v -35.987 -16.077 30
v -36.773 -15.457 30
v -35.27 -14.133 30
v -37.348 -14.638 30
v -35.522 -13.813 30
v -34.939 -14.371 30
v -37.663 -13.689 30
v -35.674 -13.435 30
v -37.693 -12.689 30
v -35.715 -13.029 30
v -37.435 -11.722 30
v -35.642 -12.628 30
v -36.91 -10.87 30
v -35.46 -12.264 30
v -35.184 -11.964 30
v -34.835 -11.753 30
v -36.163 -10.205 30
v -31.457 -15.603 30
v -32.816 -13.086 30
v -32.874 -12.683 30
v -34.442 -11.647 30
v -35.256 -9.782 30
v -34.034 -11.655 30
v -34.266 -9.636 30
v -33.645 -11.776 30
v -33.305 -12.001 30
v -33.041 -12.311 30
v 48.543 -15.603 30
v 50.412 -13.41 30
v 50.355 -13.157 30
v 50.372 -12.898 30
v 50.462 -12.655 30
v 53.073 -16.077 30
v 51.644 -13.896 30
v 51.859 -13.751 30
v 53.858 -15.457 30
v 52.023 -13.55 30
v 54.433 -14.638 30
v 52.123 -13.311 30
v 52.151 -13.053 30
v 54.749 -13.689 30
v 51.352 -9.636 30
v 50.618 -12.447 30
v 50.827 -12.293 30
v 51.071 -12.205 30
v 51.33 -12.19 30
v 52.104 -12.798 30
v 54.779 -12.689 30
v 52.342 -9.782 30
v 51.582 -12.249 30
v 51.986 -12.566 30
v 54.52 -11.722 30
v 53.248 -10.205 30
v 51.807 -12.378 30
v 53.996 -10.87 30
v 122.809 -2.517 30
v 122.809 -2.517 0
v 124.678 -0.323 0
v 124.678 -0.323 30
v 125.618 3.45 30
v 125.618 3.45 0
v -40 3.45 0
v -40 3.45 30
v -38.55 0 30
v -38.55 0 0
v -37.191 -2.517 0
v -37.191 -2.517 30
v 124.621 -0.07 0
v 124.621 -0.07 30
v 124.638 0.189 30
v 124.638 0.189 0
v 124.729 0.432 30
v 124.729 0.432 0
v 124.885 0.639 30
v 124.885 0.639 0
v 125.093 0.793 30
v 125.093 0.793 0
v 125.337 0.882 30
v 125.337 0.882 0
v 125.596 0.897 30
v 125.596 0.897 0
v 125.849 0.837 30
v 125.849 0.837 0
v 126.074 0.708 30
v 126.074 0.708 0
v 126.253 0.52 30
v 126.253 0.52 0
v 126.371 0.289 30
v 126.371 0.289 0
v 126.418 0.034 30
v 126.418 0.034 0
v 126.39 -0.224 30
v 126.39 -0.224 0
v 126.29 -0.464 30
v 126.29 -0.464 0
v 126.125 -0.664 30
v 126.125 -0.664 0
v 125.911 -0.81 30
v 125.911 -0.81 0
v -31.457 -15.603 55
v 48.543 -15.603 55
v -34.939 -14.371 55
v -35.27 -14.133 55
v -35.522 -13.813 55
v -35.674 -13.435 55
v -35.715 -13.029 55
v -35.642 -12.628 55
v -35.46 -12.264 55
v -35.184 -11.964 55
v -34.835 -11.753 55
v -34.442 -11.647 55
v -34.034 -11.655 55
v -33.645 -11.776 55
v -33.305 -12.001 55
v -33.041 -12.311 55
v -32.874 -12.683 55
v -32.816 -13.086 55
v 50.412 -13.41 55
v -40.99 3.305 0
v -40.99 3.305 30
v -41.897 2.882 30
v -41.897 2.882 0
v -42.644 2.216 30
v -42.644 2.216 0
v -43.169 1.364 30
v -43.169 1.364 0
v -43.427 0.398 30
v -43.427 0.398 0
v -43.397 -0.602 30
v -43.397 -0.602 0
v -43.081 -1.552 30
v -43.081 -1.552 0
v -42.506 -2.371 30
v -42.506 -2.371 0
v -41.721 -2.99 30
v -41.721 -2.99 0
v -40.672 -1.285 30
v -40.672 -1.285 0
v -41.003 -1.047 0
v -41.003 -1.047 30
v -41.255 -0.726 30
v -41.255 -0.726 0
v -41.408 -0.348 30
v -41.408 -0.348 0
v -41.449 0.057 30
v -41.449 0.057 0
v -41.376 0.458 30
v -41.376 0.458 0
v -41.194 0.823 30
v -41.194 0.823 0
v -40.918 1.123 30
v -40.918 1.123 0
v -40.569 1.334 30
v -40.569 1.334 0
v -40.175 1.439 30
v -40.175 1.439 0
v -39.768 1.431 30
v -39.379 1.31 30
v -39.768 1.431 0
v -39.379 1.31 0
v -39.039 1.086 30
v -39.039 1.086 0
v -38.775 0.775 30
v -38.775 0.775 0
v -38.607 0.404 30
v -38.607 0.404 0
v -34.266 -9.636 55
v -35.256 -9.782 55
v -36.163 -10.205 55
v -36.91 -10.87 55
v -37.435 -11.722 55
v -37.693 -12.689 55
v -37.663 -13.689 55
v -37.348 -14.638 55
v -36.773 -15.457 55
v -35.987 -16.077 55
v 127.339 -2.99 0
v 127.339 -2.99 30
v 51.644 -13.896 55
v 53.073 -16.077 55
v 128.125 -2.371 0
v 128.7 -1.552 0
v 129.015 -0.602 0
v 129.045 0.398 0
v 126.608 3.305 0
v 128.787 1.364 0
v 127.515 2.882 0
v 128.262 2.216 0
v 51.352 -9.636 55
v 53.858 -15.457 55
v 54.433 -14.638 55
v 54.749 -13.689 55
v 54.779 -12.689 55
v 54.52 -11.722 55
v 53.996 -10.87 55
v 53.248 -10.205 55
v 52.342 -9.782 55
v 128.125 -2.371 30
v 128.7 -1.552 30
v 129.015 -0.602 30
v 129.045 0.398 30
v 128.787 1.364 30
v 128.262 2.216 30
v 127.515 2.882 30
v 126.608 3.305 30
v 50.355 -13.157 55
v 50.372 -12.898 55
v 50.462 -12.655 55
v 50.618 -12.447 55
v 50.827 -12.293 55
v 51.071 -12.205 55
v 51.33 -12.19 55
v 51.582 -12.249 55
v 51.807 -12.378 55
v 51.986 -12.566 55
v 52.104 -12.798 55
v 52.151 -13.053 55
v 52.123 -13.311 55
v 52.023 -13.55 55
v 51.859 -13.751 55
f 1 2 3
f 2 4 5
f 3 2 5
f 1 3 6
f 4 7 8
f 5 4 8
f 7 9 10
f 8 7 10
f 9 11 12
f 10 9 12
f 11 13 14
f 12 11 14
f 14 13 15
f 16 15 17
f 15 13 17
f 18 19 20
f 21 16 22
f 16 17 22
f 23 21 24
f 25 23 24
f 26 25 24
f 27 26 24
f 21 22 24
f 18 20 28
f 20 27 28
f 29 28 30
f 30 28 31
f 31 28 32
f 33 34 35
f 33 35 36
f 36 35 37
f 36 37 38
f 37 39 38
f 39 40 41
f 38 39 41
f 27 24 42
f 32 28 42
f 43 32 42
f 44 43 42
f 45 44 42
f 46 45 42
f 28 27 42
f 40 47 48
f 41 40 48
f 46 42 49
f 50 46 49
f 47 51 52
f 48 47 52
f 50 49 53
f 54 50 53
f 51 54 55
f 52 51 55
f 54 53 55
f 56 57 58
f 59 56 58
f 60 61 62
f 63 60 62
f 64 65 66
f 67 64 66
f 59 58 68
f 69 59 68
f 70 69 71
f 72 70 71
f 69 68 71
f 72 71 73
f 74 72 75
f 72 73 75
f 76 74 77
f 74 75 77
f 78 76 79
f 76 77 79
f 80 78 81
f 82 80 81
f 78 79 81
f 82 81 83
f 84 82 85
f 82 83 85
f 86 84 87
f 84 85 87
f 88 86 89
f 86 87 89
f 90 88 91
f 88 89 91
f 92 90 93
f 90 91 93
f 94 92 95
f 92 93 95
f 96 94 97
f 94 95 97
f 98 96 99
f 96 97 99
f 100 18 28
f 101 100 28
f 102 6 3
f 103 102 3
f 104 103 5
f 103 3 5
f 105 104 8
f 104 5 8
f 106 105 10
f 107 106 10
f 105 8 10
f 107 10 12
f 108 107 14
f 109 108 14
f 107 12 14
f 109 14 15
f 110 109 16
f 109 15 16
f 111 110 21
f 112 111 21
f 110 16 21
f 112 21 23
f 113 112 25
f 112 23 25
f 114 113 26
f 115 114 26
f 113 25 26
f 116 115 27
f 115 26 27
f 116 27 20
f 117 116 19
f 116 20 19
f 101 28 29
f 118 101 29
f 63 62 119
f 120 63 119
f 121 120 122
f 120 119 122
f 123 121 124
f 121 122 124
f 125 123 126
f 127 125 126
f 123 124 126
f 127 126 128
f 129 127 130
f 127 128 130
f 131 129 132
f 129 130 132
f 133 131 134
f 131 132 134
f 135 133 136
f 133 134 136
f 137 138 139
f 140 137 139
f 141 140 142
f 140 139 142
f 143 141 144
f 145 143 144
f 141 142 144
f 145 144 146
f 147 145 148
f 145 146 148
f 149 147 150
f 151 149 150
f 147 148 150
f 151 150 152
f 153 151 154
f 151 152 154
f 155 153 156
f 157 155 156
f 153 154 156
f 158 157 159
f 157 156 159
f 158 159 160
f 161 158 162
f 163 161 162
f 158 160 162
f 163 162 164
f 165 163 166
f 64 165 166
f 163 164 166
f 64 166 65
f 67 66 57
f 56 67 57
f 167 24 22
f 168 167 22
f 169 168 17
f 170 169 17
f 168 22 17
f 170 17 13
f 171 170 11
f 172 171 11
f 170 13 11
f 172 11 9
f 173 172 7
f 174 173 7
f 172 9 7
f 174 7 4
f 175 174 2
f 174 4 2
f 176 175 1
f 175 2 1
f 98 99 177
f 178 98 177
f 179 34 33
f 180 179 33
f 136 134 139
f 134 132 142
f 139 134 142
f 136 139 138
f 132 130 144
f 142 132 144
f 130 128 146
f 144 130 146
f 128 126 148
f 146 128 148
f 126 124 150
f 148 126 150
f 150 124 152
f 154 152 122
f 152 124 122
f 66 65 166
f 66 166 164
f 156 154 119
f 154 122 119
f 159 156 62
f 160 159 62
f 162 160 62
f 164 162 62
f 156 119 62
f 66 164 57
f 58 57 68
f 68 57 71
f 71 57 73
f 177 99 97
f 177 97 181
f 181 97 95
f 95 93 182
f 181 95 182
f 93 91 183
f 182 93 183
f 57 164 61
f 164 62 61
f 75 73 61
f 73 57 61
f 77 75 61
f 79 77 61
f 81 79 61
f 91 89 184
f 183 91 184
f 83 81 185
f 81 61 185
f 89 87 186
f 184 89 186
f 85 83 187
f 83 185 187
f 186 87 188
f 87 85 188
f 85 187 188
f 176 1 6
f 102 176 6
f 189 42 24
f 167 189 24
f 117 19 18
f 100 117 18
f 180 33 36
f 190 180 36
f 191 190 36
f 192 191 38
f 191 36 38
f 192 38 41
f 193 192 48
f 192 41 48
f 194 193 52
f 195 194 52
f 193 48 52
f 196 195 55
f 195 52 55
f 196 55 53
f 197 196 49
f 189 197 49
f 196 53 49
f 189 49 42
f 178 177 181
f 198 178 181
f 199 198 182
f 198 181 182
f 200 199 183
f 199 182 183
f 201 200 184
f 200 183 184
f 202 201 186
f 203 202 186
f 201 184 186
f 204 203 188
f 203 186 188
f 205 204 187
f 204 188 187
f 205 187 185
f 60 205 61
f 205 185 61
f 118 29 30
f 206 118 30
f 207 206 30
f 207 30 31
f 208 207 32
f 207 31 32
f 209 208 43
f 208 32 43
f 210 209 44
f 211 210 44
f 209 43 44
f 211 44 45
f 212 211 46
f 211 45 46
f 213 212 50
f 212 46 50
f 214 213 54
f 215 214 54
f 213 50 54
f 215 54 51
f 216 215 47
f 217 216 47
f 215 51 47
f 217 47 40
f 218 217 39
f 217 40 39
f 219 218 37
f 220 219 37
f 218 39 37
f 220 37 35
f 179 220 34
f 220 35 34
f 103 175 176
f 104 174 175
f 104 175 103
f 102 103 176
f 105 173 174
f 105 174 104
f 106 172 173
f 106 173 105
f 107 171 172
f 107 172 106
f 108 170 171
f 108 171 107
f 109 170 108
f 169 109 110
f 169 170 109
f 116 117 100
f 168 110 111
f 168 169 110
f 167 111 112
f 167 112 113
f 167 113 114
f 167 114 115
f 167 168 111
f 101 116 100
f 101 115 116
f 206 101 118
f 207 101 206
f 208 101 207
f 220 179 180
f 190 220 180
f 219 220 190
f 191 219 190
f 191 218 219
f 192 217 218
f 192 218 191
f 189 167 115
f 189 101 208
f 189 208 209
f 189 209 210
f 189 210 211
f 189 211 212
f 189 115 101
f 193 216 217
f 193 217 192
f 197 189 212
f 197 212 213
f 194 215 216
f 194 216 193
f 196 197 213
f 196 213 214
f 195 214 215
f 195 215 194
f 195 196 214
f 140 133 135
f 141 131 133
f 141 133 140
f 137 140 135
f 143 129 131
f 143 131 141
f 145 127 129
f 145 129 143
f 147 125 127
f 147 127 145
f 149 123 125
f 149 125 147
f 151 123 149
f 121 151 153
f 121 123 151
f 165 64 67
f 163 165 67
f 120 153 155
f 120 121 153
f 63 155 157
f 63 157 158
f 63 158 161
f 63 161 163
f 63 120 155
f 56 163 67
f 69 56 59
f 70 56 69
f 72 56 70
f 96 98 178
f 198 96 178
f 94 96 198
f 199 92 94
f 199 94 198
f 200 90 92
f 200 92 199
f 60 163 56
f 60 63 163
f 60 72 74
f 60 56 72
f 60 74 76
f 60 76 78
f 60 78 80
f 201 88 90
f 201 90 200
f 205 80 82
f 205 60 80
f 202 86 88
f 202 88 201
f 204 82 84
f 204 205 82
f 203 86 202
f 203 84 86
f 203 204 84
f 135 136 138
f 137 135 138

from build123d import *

# Parameters (mm, degrees)
F1_DEPTH = 30
F3_DEPTH = 25


with BuildPart() as f1:
    # F0 (on Top) → F1 (new body)
    with BuildSketch(Plane.XY):
        with BuildLine():
            ThreePointArc((-40.672448, -1.284646), (-40.750817, 1.240474), (-38.55, 0))
            Line((-38.55, 0), (-37.190883, -2.516997))
            Line((-37.190883, -2.516997), (42.809117, -2.516997))
            Line((42.809117, -2.516997), (42.809117, 3.45))
            Line((42.809117, 3.45), (-40, 3.45))
            ThreePointArc((-40, 3.45), (-43.333073, 0.890577), (-41.720787, -2.990216))
            Line((-41.720787, -2.990216), (-40.672448, -1.284646))
        make_face()
        with BuildLine():
            Line((42.809117, 3.45), (42.809117, -2.516997))
            Line((42.809117, -2.516997), (122.809117, -2.516997))
            Line((122.809117, -2.516997), (124.678304, -0.323294))
            ThreePointArc((124.678304, -0.323294), (125.848812, 0.837089), (125.910627, -0.809955))
            Line((125.910627, -0.809955), (127.33902, -2.990216))
            ThreePointArc((127.33902, -2.990216), (128.951306, 0.890577), (125.618234, 3.45))
            Line((125.618234, 3.45), (42.809117, 3.45))
        make_face()
    extrude(amount=F1_DEPTH)


with BuildPart() as f3:
    # F2 (on face) → F3 (new body)
    with BuildSketch(Plane.XY.offset(30)):
        with BuildLine():
            ThreePointArc((53.072564, -16.076712), (54.684849, -12.195919), (51.351777, -9.636496))
            Line((51.351777, -9.636496), (8.54266, -9.636496))
            Line((8.54266, -9.636496), (-34.266457, -9.636496))
            ThreePointArc((-34.266457, -9.636496), (-37.599529, -12.195919), (-35.987244, -16.076712))
            Line((-35.987244, -16.076712), (-34.938904, -14.371141))
            ThreePointArc((-34.938904, -14.371141), (-35.017273, -11.846022), (-32.816457, -13.086496))
            Line((-32.816457, -13.086496), (-31.45734, -15.603493))
            Line((-31.45734, -15.603493), (8.54266, -15.603493))
            Line((8.54266, -15.603493), (48.54266, -15.603493))
            Line((48.54266, -15.603493), (50.411848, -13.40979))
            ThreePointArc((50.411848, -13.40979), (51.582355, -12.249407), (51.64417, -13.896451))
            Line((51.64417, -13.896451), (53.072564, -16.076712))
        make_face()
    extrude(amount=F3_DEPTH)


solid = Compound([f1.part, f3.part])
